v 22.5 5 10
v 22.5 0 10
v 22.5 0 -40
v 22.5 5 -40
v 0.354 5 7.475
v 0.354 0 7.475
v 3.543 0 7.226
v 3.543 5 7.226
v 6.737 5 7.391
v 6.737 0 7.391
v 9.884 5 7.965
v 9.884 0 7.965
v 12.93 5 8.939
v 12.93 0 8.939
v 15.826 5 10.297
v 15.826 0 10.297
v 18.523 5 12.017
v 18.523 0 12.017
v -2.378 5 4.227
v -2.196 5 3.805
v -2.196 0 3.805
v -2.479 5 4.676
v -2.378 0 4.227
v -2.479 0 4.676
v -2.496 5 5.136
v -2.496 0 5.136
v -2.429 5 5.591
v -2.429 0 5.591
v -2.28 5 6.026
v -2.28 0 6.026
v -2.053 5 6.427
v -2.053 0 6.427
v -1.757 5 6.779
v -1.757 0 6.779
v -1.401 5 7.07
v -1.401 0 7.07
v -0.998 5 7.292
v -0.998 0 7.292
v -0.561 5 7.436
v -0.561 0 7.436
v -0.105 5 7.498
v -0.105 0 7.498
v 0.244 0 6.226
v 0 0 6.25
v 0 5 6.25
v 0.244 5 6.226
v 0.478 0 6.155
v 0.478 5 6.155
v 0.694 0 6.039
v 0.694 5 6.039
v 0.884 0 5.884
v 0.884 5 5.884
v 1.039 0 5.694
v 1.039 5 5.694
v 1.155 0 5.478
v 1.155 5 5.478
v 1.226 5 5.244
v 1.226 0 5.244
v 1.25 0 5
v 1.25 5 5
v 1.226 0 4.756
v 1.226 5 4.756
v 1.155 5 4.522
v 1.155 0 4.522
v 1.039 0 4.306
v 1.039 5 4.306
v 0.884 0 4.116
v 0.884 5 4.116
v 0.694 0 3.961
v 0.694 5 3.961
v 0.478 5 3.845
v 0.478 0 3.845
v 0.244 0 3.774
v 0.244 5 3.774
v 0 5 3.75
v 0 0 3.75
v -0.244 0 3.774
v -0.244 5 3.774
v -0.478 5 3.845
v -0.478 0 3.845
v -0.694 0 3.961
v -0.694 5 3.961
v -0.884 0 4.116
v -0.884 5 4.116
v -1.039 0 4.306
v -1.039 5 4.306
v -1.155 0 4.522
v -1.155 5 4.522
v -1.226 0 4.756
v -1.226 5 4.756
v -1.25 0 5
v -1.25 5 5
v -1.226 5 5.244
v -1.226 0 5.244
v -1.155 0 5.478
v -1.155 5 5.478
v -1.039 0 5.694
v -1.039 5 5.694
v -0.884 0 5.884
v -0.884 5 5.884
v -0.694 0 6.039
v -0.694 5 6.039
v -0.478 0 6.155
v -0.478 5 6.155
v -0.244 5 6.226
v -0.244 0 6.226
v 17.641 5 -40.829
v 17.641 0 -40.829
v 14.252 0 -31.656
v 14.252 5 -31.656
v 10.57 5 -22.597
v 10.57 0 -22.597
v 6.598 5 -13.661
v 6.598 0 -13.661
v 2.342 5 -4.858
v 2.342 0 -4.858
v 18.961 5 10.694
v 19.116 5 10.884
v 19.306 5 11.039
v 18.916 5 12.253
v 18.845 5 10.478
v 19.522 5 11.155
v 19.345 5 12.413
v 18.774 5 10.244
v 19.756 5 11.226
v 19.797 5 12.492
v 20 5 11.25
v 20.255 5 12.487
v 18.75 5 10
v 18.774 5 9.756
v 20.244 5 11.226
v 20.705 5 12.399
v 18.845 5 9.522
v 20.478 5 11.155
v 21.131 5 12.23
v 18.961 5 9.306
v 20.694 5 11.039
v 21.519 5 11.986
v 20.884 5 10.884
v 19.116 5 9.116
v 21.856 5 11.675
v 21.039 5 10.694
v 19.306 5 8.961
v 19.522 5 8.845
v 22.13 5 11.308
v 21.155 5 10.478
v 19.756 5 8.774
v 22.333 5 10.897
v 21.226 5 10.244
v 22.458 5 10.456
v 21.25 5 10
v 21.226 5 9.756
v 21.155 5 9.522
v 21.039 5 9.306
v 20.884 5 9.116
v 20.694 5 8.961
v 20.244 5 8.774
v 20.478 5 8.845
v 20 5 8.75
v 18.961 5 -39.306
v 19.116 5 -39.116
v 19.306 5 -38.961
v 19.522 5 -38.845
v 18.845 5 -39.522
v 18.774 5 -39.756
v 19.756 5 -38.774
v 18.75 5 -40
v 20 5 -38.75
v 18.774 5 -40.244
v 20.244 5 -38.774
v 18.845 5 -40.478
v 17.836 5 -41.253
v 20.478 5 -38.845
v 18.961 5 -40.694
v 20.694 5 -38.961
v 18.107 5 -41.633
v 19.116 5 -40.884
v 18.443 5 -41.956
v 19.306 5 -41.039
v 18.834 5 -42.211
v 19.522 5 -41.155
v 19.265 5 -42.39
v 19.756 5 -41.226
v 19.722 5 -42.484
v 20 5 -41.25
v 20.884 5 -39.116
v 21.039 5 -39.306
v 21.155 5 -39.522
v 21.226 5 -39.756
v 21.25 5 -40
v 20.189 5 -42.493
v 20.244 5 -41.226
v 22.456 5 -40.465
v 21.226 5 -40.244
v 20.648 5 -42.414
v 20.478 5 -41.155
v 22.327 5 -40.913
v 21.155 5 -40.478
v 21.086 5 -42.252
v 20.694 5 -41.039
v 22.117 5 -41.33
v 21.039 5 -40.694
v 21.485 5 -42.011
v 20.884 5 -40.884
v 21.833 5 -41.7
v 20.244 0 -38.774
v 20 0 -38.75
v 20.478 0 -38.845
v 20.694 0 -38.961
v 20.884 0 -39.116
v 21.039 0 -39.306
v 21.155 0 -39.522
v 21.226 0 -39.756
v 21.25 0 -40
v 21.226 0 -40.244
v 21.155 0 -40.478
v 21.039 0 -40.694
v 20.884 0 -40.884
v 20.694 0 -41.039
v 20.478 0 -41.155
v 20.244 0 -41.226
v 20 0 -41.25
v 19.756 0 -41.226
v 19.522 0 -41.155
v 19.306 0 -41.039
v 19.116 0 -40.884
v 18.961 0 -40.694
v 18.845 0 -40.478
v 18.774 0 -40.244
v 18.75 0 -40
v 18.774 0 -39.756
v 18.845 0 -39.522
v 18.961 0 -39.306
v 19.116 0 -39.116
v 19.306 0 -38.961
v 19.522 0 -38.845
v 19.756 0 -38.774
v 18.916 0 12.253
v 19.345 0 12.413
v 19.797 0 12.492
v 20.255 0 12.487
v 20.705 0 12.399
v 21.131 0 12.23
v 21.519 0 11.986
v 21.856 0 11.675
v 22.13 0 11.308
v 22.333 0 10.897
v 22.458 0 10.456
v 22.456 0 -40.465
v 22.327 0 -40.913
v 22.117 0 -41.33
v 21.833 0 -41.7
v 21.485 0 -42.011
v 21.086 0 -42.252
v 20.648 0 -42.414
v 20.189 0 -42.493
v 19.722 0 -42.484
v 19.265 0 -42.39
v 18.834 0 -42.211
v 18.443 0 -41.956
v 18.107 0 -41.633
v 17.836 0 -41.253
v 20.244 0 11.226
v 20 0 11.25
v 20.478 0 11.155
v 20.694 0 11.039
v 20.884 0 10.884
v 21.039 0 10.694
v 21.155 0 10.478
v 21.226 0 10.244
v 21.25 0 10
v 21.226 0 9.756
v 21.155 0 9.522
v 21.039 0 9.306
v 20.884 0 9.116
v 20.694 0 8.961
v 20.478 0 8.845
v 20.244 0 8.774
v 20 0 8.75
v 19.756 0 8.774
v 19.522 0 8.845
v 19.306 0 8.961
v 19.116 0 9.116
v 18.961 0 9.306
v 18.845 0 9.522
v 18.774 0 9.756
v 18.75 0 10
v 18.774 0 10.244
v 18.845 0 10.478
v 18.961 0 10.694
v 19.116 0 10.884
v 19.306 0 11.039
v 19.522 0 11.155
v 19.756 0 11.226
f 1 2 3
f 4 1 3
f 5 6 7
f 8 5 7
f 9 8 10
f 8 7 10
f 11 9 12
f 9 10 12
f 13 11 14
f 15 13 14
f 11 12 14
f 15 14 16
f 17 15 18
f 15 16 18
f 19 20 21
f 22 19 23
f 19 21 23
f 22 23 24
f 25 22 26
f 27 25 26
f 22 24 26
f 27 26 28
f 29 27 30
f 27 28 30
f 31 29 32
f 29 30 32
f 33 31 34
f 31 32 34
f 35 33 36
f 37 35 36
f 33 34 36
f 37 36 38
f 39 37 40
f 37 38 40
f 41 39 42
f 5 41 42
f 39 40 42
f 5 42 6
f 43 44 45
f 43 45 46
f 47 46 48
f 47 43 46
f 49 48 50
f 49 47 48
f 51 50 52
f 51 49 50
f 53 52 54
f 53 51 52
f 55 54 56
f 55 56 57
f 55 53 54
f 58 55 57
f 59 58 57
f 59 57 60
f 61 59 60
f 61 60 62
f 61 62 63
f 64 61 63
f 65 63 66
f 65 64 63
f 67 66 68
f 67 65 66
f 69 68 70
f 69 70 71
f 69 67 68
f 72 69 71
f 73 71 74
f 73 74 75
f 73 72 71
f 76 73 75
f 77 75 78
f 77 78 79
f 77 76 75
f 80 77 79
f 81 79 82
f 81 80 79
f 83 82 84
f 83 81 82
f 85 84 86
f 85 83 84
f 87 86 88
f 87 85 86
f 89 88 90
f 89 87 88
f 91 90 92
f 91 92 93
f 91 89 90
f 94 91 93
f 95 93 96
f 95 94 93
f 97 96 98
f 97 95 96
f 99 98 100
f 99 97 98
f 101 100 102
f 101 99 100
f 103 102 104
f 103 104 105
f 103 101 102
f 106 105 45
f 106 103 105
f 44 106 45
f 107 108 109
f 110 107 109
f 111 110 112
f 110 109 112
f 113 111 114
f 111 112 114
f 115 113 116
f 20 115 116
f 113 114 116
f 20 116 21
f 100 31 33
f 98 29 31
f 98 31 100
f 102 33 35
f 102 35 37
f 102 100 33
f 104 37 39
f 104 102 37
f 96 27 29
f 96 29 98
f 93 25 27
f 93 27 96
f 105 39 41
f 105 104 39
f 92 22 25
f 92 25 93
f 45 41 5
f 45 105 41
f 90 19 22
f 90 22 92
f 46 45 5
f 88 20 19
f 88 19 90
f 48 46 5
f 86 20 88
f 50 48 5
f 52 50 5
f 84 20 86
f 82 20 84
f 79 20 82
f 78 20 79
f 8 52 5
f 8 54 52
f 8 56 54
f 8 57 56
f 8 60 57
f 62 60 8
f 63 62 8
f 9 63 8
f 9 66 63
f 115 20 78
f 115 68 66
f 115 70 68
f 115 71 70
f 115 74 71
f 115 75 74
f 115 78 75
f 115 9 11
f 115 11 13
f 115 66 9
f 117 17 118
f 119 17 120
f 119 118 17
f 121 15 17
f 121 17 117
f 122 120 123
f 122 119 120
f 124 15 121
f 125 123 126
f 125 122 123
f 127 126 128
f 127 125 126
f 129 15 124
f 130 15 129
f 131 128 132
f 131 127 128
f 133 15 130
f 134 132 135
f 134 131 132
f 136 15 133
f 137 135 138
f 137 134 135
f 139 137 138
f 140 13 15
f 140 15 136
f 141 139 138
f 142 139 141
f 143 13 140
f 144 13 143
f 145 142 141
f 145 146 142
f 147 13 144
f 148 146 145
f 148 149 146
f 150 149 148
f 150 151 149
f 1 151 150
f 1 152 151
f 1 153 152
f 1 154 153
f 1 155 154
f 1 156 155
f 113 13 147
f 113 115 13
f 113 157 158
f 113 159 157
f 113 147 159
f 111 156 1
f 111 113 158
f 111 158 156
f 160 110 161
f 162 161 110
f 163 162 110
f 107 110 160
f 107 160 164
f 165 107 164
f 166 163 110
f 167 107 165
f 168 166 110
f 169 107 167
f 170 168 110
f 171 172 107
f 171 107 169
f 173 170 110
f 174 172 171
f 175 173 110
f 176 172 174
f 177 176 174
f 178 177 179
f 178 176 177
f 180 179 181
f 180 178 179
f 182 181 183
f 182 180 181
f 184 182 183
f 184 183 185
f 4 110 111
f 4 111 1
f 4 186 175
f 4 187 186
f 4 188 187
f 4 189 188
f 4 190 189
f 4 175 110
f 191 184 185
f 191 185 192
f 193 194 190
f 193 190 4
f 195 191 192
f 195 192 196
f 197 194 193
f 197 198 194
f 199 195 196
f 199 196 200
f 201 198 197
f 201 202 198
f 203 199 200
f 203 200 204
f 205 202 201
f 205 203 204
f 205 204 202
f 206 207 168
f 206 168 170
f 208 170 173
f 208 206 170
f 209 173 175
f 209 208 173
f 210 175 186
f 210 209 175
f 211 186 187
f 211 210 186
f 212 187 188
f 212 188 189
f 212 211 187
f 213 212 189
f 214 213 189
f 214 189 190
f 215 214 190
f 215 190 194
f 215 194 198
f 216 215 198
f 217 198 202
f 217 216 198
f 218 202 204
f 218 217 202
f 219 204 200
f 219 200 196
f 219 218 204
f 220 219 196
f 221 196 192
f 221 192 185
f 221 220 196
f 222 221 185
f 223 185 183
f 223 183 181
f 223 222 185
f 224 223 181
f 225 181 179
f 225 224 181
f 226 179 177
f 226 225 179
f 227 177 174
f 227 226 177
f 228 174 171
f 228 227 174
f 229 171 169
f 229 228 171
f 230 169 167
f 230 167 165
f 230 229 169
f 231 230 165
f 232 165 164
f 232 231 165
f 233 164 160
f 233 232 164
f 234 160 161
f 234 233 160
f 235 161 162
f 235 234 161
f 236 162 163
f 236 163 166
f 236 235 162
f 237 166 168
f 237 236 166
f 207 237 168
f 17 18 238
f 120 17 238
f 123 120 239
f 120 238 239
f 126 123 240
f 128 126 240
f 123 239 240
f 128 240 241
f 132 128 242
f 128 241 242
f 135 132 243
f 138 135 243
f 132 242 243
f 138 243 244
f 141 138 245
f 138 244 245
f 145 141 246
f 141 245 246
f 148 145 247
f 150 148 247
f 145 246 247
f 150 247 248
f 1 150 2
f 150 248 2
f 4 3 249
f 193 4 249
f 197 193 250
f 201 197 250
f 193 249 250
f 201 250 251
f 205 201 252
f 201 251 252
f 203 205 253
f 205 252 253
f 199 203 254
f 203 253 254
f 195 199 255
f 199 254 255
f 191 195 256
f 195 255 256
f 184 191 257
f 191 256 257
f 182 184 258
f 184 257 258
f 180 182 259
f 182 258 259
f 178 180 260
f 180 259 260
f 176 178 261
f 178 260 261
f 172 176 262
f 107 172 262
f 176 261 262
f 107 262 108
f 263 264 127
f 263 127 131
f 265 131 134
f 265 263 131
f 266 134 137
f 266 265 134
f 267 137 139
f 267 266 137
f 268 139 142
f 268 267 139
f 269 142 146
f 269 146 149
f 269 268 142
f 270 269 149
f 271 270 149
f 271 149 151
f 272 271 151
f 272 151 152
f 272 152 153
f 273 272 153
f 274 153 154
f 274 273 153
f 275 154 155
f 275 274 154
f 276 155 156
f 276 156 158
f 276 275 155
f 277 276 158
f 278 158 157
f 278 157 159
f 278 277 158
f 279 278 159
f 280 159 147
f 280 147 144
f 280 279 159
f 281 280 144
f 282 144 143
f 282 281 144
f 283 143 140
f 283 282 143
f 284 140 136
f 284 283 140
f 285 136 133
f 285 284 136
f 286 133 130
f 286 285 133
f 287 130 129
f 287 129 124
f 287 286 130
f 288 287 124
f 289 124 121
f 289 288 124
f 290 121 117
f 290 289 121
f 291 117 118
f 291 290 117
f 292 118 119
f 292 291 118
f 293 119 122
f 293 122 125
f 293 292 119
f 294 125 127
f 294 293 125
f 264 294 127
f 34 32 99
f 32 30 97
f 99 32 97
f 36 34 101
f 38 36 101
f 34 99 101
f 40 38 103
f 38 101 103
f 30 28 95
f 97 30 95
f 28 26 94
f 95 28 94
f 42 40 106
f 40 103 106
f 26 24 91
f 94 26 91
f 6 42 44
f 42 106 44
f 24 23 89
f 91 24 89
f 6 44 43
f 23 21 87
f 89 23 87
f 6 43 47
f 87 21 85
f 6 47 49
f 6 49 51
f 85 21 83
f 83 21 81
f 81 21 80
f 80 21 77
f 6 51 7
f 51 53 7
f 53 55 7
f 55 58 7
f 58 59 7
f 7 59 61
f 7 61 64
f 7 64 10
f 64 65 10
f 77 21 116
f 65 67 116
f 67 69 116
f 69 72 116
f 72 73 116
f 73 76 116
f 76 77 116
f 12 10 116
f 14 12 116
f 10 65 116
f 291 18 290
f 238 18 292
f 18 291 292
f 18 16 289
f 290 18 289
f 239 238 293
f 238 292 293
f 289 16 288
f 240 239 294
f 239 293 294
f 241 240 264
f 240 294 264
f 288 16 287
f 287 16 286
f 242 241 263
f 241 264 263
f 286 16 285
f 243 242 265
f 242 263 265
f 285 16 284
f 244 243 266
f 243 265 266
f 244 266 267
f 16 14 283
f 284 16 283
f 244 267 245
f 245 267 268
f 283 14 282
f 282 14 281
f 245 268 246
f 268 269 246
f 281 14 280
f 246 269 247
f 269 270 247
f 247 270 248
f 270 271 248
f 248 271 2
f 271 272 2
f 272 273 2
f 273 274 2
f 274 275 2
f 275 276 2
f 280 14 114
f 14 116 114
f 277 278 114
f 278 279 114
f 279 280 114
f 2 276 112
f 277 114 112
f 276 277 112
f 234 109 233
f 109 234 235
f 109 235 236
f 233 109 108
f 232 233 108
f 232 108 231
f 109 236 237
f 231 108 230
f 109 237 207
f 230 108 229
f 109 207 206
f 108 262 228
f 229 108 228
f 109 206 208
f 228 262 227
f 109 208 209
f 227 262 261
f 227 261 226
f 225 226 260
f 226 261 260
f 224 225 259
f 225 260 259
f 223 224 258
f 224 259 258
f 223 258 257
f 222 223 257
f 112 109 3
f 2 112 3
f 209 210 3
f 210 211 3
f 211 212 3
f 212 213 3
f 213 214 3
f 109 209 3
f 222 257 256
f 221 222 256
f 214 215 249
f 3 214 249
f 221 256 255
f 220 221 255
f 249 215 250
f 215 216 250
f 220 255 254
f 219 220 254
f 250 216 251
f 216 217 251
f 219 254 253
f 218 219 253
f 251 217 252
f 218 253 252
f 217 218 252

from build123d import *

# Parameters (mm, degrees)
SKETCH1_R           = 2.5
SKETCH1_R_2         = 1.25
BOSS_EXTRUDE1_DEPTH = 5


with BuildPart() as part:
    # Sketch1 → Boss-Extrude1 (new body)
    # profile 1 of 4: a face of its own
    with BuildSketch(Plane(origin=(0, 0, 0), x_dir=(1, 0, 0), z_dir=(0, 1, 0))):
        with Locations((0, -5)):
            Circle(SKETCH1_R)
        with Locations(Location((0, -5, 0), (0, 0, 270))):
            Circle(SKETCH1_R_2, mode=Mode.SUBTRACT)
    # profile 2 of 4: a face of its own
    with BuildSketch(Plane(origin=(0, 0, 0), x_dir=(1, 0, 0), z_dir=(0, 1, 0))):
        with BuildLine():
            Line((22.5, -10), (22.5, 40))
            ThreePointArc((22.5, 40), (19.579674257, 37.535588048), (17.641338984, 40.828684628))
            ThreePointArc((17.641338984, 40.828684628), (8.619996831, 18.113334742), (-2.195652157, -3.80454544))
            ThreePointArc((-2.195652157, -3.80454544), (0.616793972, -2.577281445), (2.5, -5))
            ThreePointArc((2.5, -5), (1.888934091, -6.637659305), (0.354457601, -7.474744393))
            ThreePointArc((0.354457601, -7.474744393), (9.883853248, -7.964587007), (18.522657697, -12.016794417))
            ThreePointArc((18.522657697, -12.016794417), (18.869370918, -7.770274035), (22.5, -10))
        make_face()
    # profile 3 of 4: a face of its own
    with BuildSketch(Plane(origin=(0, 0, 0), x_dir=(1, 0, 0), z_dir=(0, 1, 0))):
        with Locations((20, -10)):
            Circle(SKETCH1_R)
        with Locations(Location((20, -10, 0), (0, 0, 270))):
            Circle(SKETCH1_R_2, mode=Mode.SUBTRACT)
    # profile 4 of 4: a face of its own
    with BuildSketch(Plane(origin=(0, 0, 0), x_dir=(1, 0, 0), z_dir=(0, 1, 0))):
        with Locations((20, 40)):
            Circle(SKETCH1_R)
        with Locations(Location((20, 40, 0), (0, 0, 270))):
            Circle(SKETCH1_R_2, mode=Mode.SUBTRACT)
    extrude(amount=BOSS_EXTRUDE1_DEPTH)


solid = part.part
